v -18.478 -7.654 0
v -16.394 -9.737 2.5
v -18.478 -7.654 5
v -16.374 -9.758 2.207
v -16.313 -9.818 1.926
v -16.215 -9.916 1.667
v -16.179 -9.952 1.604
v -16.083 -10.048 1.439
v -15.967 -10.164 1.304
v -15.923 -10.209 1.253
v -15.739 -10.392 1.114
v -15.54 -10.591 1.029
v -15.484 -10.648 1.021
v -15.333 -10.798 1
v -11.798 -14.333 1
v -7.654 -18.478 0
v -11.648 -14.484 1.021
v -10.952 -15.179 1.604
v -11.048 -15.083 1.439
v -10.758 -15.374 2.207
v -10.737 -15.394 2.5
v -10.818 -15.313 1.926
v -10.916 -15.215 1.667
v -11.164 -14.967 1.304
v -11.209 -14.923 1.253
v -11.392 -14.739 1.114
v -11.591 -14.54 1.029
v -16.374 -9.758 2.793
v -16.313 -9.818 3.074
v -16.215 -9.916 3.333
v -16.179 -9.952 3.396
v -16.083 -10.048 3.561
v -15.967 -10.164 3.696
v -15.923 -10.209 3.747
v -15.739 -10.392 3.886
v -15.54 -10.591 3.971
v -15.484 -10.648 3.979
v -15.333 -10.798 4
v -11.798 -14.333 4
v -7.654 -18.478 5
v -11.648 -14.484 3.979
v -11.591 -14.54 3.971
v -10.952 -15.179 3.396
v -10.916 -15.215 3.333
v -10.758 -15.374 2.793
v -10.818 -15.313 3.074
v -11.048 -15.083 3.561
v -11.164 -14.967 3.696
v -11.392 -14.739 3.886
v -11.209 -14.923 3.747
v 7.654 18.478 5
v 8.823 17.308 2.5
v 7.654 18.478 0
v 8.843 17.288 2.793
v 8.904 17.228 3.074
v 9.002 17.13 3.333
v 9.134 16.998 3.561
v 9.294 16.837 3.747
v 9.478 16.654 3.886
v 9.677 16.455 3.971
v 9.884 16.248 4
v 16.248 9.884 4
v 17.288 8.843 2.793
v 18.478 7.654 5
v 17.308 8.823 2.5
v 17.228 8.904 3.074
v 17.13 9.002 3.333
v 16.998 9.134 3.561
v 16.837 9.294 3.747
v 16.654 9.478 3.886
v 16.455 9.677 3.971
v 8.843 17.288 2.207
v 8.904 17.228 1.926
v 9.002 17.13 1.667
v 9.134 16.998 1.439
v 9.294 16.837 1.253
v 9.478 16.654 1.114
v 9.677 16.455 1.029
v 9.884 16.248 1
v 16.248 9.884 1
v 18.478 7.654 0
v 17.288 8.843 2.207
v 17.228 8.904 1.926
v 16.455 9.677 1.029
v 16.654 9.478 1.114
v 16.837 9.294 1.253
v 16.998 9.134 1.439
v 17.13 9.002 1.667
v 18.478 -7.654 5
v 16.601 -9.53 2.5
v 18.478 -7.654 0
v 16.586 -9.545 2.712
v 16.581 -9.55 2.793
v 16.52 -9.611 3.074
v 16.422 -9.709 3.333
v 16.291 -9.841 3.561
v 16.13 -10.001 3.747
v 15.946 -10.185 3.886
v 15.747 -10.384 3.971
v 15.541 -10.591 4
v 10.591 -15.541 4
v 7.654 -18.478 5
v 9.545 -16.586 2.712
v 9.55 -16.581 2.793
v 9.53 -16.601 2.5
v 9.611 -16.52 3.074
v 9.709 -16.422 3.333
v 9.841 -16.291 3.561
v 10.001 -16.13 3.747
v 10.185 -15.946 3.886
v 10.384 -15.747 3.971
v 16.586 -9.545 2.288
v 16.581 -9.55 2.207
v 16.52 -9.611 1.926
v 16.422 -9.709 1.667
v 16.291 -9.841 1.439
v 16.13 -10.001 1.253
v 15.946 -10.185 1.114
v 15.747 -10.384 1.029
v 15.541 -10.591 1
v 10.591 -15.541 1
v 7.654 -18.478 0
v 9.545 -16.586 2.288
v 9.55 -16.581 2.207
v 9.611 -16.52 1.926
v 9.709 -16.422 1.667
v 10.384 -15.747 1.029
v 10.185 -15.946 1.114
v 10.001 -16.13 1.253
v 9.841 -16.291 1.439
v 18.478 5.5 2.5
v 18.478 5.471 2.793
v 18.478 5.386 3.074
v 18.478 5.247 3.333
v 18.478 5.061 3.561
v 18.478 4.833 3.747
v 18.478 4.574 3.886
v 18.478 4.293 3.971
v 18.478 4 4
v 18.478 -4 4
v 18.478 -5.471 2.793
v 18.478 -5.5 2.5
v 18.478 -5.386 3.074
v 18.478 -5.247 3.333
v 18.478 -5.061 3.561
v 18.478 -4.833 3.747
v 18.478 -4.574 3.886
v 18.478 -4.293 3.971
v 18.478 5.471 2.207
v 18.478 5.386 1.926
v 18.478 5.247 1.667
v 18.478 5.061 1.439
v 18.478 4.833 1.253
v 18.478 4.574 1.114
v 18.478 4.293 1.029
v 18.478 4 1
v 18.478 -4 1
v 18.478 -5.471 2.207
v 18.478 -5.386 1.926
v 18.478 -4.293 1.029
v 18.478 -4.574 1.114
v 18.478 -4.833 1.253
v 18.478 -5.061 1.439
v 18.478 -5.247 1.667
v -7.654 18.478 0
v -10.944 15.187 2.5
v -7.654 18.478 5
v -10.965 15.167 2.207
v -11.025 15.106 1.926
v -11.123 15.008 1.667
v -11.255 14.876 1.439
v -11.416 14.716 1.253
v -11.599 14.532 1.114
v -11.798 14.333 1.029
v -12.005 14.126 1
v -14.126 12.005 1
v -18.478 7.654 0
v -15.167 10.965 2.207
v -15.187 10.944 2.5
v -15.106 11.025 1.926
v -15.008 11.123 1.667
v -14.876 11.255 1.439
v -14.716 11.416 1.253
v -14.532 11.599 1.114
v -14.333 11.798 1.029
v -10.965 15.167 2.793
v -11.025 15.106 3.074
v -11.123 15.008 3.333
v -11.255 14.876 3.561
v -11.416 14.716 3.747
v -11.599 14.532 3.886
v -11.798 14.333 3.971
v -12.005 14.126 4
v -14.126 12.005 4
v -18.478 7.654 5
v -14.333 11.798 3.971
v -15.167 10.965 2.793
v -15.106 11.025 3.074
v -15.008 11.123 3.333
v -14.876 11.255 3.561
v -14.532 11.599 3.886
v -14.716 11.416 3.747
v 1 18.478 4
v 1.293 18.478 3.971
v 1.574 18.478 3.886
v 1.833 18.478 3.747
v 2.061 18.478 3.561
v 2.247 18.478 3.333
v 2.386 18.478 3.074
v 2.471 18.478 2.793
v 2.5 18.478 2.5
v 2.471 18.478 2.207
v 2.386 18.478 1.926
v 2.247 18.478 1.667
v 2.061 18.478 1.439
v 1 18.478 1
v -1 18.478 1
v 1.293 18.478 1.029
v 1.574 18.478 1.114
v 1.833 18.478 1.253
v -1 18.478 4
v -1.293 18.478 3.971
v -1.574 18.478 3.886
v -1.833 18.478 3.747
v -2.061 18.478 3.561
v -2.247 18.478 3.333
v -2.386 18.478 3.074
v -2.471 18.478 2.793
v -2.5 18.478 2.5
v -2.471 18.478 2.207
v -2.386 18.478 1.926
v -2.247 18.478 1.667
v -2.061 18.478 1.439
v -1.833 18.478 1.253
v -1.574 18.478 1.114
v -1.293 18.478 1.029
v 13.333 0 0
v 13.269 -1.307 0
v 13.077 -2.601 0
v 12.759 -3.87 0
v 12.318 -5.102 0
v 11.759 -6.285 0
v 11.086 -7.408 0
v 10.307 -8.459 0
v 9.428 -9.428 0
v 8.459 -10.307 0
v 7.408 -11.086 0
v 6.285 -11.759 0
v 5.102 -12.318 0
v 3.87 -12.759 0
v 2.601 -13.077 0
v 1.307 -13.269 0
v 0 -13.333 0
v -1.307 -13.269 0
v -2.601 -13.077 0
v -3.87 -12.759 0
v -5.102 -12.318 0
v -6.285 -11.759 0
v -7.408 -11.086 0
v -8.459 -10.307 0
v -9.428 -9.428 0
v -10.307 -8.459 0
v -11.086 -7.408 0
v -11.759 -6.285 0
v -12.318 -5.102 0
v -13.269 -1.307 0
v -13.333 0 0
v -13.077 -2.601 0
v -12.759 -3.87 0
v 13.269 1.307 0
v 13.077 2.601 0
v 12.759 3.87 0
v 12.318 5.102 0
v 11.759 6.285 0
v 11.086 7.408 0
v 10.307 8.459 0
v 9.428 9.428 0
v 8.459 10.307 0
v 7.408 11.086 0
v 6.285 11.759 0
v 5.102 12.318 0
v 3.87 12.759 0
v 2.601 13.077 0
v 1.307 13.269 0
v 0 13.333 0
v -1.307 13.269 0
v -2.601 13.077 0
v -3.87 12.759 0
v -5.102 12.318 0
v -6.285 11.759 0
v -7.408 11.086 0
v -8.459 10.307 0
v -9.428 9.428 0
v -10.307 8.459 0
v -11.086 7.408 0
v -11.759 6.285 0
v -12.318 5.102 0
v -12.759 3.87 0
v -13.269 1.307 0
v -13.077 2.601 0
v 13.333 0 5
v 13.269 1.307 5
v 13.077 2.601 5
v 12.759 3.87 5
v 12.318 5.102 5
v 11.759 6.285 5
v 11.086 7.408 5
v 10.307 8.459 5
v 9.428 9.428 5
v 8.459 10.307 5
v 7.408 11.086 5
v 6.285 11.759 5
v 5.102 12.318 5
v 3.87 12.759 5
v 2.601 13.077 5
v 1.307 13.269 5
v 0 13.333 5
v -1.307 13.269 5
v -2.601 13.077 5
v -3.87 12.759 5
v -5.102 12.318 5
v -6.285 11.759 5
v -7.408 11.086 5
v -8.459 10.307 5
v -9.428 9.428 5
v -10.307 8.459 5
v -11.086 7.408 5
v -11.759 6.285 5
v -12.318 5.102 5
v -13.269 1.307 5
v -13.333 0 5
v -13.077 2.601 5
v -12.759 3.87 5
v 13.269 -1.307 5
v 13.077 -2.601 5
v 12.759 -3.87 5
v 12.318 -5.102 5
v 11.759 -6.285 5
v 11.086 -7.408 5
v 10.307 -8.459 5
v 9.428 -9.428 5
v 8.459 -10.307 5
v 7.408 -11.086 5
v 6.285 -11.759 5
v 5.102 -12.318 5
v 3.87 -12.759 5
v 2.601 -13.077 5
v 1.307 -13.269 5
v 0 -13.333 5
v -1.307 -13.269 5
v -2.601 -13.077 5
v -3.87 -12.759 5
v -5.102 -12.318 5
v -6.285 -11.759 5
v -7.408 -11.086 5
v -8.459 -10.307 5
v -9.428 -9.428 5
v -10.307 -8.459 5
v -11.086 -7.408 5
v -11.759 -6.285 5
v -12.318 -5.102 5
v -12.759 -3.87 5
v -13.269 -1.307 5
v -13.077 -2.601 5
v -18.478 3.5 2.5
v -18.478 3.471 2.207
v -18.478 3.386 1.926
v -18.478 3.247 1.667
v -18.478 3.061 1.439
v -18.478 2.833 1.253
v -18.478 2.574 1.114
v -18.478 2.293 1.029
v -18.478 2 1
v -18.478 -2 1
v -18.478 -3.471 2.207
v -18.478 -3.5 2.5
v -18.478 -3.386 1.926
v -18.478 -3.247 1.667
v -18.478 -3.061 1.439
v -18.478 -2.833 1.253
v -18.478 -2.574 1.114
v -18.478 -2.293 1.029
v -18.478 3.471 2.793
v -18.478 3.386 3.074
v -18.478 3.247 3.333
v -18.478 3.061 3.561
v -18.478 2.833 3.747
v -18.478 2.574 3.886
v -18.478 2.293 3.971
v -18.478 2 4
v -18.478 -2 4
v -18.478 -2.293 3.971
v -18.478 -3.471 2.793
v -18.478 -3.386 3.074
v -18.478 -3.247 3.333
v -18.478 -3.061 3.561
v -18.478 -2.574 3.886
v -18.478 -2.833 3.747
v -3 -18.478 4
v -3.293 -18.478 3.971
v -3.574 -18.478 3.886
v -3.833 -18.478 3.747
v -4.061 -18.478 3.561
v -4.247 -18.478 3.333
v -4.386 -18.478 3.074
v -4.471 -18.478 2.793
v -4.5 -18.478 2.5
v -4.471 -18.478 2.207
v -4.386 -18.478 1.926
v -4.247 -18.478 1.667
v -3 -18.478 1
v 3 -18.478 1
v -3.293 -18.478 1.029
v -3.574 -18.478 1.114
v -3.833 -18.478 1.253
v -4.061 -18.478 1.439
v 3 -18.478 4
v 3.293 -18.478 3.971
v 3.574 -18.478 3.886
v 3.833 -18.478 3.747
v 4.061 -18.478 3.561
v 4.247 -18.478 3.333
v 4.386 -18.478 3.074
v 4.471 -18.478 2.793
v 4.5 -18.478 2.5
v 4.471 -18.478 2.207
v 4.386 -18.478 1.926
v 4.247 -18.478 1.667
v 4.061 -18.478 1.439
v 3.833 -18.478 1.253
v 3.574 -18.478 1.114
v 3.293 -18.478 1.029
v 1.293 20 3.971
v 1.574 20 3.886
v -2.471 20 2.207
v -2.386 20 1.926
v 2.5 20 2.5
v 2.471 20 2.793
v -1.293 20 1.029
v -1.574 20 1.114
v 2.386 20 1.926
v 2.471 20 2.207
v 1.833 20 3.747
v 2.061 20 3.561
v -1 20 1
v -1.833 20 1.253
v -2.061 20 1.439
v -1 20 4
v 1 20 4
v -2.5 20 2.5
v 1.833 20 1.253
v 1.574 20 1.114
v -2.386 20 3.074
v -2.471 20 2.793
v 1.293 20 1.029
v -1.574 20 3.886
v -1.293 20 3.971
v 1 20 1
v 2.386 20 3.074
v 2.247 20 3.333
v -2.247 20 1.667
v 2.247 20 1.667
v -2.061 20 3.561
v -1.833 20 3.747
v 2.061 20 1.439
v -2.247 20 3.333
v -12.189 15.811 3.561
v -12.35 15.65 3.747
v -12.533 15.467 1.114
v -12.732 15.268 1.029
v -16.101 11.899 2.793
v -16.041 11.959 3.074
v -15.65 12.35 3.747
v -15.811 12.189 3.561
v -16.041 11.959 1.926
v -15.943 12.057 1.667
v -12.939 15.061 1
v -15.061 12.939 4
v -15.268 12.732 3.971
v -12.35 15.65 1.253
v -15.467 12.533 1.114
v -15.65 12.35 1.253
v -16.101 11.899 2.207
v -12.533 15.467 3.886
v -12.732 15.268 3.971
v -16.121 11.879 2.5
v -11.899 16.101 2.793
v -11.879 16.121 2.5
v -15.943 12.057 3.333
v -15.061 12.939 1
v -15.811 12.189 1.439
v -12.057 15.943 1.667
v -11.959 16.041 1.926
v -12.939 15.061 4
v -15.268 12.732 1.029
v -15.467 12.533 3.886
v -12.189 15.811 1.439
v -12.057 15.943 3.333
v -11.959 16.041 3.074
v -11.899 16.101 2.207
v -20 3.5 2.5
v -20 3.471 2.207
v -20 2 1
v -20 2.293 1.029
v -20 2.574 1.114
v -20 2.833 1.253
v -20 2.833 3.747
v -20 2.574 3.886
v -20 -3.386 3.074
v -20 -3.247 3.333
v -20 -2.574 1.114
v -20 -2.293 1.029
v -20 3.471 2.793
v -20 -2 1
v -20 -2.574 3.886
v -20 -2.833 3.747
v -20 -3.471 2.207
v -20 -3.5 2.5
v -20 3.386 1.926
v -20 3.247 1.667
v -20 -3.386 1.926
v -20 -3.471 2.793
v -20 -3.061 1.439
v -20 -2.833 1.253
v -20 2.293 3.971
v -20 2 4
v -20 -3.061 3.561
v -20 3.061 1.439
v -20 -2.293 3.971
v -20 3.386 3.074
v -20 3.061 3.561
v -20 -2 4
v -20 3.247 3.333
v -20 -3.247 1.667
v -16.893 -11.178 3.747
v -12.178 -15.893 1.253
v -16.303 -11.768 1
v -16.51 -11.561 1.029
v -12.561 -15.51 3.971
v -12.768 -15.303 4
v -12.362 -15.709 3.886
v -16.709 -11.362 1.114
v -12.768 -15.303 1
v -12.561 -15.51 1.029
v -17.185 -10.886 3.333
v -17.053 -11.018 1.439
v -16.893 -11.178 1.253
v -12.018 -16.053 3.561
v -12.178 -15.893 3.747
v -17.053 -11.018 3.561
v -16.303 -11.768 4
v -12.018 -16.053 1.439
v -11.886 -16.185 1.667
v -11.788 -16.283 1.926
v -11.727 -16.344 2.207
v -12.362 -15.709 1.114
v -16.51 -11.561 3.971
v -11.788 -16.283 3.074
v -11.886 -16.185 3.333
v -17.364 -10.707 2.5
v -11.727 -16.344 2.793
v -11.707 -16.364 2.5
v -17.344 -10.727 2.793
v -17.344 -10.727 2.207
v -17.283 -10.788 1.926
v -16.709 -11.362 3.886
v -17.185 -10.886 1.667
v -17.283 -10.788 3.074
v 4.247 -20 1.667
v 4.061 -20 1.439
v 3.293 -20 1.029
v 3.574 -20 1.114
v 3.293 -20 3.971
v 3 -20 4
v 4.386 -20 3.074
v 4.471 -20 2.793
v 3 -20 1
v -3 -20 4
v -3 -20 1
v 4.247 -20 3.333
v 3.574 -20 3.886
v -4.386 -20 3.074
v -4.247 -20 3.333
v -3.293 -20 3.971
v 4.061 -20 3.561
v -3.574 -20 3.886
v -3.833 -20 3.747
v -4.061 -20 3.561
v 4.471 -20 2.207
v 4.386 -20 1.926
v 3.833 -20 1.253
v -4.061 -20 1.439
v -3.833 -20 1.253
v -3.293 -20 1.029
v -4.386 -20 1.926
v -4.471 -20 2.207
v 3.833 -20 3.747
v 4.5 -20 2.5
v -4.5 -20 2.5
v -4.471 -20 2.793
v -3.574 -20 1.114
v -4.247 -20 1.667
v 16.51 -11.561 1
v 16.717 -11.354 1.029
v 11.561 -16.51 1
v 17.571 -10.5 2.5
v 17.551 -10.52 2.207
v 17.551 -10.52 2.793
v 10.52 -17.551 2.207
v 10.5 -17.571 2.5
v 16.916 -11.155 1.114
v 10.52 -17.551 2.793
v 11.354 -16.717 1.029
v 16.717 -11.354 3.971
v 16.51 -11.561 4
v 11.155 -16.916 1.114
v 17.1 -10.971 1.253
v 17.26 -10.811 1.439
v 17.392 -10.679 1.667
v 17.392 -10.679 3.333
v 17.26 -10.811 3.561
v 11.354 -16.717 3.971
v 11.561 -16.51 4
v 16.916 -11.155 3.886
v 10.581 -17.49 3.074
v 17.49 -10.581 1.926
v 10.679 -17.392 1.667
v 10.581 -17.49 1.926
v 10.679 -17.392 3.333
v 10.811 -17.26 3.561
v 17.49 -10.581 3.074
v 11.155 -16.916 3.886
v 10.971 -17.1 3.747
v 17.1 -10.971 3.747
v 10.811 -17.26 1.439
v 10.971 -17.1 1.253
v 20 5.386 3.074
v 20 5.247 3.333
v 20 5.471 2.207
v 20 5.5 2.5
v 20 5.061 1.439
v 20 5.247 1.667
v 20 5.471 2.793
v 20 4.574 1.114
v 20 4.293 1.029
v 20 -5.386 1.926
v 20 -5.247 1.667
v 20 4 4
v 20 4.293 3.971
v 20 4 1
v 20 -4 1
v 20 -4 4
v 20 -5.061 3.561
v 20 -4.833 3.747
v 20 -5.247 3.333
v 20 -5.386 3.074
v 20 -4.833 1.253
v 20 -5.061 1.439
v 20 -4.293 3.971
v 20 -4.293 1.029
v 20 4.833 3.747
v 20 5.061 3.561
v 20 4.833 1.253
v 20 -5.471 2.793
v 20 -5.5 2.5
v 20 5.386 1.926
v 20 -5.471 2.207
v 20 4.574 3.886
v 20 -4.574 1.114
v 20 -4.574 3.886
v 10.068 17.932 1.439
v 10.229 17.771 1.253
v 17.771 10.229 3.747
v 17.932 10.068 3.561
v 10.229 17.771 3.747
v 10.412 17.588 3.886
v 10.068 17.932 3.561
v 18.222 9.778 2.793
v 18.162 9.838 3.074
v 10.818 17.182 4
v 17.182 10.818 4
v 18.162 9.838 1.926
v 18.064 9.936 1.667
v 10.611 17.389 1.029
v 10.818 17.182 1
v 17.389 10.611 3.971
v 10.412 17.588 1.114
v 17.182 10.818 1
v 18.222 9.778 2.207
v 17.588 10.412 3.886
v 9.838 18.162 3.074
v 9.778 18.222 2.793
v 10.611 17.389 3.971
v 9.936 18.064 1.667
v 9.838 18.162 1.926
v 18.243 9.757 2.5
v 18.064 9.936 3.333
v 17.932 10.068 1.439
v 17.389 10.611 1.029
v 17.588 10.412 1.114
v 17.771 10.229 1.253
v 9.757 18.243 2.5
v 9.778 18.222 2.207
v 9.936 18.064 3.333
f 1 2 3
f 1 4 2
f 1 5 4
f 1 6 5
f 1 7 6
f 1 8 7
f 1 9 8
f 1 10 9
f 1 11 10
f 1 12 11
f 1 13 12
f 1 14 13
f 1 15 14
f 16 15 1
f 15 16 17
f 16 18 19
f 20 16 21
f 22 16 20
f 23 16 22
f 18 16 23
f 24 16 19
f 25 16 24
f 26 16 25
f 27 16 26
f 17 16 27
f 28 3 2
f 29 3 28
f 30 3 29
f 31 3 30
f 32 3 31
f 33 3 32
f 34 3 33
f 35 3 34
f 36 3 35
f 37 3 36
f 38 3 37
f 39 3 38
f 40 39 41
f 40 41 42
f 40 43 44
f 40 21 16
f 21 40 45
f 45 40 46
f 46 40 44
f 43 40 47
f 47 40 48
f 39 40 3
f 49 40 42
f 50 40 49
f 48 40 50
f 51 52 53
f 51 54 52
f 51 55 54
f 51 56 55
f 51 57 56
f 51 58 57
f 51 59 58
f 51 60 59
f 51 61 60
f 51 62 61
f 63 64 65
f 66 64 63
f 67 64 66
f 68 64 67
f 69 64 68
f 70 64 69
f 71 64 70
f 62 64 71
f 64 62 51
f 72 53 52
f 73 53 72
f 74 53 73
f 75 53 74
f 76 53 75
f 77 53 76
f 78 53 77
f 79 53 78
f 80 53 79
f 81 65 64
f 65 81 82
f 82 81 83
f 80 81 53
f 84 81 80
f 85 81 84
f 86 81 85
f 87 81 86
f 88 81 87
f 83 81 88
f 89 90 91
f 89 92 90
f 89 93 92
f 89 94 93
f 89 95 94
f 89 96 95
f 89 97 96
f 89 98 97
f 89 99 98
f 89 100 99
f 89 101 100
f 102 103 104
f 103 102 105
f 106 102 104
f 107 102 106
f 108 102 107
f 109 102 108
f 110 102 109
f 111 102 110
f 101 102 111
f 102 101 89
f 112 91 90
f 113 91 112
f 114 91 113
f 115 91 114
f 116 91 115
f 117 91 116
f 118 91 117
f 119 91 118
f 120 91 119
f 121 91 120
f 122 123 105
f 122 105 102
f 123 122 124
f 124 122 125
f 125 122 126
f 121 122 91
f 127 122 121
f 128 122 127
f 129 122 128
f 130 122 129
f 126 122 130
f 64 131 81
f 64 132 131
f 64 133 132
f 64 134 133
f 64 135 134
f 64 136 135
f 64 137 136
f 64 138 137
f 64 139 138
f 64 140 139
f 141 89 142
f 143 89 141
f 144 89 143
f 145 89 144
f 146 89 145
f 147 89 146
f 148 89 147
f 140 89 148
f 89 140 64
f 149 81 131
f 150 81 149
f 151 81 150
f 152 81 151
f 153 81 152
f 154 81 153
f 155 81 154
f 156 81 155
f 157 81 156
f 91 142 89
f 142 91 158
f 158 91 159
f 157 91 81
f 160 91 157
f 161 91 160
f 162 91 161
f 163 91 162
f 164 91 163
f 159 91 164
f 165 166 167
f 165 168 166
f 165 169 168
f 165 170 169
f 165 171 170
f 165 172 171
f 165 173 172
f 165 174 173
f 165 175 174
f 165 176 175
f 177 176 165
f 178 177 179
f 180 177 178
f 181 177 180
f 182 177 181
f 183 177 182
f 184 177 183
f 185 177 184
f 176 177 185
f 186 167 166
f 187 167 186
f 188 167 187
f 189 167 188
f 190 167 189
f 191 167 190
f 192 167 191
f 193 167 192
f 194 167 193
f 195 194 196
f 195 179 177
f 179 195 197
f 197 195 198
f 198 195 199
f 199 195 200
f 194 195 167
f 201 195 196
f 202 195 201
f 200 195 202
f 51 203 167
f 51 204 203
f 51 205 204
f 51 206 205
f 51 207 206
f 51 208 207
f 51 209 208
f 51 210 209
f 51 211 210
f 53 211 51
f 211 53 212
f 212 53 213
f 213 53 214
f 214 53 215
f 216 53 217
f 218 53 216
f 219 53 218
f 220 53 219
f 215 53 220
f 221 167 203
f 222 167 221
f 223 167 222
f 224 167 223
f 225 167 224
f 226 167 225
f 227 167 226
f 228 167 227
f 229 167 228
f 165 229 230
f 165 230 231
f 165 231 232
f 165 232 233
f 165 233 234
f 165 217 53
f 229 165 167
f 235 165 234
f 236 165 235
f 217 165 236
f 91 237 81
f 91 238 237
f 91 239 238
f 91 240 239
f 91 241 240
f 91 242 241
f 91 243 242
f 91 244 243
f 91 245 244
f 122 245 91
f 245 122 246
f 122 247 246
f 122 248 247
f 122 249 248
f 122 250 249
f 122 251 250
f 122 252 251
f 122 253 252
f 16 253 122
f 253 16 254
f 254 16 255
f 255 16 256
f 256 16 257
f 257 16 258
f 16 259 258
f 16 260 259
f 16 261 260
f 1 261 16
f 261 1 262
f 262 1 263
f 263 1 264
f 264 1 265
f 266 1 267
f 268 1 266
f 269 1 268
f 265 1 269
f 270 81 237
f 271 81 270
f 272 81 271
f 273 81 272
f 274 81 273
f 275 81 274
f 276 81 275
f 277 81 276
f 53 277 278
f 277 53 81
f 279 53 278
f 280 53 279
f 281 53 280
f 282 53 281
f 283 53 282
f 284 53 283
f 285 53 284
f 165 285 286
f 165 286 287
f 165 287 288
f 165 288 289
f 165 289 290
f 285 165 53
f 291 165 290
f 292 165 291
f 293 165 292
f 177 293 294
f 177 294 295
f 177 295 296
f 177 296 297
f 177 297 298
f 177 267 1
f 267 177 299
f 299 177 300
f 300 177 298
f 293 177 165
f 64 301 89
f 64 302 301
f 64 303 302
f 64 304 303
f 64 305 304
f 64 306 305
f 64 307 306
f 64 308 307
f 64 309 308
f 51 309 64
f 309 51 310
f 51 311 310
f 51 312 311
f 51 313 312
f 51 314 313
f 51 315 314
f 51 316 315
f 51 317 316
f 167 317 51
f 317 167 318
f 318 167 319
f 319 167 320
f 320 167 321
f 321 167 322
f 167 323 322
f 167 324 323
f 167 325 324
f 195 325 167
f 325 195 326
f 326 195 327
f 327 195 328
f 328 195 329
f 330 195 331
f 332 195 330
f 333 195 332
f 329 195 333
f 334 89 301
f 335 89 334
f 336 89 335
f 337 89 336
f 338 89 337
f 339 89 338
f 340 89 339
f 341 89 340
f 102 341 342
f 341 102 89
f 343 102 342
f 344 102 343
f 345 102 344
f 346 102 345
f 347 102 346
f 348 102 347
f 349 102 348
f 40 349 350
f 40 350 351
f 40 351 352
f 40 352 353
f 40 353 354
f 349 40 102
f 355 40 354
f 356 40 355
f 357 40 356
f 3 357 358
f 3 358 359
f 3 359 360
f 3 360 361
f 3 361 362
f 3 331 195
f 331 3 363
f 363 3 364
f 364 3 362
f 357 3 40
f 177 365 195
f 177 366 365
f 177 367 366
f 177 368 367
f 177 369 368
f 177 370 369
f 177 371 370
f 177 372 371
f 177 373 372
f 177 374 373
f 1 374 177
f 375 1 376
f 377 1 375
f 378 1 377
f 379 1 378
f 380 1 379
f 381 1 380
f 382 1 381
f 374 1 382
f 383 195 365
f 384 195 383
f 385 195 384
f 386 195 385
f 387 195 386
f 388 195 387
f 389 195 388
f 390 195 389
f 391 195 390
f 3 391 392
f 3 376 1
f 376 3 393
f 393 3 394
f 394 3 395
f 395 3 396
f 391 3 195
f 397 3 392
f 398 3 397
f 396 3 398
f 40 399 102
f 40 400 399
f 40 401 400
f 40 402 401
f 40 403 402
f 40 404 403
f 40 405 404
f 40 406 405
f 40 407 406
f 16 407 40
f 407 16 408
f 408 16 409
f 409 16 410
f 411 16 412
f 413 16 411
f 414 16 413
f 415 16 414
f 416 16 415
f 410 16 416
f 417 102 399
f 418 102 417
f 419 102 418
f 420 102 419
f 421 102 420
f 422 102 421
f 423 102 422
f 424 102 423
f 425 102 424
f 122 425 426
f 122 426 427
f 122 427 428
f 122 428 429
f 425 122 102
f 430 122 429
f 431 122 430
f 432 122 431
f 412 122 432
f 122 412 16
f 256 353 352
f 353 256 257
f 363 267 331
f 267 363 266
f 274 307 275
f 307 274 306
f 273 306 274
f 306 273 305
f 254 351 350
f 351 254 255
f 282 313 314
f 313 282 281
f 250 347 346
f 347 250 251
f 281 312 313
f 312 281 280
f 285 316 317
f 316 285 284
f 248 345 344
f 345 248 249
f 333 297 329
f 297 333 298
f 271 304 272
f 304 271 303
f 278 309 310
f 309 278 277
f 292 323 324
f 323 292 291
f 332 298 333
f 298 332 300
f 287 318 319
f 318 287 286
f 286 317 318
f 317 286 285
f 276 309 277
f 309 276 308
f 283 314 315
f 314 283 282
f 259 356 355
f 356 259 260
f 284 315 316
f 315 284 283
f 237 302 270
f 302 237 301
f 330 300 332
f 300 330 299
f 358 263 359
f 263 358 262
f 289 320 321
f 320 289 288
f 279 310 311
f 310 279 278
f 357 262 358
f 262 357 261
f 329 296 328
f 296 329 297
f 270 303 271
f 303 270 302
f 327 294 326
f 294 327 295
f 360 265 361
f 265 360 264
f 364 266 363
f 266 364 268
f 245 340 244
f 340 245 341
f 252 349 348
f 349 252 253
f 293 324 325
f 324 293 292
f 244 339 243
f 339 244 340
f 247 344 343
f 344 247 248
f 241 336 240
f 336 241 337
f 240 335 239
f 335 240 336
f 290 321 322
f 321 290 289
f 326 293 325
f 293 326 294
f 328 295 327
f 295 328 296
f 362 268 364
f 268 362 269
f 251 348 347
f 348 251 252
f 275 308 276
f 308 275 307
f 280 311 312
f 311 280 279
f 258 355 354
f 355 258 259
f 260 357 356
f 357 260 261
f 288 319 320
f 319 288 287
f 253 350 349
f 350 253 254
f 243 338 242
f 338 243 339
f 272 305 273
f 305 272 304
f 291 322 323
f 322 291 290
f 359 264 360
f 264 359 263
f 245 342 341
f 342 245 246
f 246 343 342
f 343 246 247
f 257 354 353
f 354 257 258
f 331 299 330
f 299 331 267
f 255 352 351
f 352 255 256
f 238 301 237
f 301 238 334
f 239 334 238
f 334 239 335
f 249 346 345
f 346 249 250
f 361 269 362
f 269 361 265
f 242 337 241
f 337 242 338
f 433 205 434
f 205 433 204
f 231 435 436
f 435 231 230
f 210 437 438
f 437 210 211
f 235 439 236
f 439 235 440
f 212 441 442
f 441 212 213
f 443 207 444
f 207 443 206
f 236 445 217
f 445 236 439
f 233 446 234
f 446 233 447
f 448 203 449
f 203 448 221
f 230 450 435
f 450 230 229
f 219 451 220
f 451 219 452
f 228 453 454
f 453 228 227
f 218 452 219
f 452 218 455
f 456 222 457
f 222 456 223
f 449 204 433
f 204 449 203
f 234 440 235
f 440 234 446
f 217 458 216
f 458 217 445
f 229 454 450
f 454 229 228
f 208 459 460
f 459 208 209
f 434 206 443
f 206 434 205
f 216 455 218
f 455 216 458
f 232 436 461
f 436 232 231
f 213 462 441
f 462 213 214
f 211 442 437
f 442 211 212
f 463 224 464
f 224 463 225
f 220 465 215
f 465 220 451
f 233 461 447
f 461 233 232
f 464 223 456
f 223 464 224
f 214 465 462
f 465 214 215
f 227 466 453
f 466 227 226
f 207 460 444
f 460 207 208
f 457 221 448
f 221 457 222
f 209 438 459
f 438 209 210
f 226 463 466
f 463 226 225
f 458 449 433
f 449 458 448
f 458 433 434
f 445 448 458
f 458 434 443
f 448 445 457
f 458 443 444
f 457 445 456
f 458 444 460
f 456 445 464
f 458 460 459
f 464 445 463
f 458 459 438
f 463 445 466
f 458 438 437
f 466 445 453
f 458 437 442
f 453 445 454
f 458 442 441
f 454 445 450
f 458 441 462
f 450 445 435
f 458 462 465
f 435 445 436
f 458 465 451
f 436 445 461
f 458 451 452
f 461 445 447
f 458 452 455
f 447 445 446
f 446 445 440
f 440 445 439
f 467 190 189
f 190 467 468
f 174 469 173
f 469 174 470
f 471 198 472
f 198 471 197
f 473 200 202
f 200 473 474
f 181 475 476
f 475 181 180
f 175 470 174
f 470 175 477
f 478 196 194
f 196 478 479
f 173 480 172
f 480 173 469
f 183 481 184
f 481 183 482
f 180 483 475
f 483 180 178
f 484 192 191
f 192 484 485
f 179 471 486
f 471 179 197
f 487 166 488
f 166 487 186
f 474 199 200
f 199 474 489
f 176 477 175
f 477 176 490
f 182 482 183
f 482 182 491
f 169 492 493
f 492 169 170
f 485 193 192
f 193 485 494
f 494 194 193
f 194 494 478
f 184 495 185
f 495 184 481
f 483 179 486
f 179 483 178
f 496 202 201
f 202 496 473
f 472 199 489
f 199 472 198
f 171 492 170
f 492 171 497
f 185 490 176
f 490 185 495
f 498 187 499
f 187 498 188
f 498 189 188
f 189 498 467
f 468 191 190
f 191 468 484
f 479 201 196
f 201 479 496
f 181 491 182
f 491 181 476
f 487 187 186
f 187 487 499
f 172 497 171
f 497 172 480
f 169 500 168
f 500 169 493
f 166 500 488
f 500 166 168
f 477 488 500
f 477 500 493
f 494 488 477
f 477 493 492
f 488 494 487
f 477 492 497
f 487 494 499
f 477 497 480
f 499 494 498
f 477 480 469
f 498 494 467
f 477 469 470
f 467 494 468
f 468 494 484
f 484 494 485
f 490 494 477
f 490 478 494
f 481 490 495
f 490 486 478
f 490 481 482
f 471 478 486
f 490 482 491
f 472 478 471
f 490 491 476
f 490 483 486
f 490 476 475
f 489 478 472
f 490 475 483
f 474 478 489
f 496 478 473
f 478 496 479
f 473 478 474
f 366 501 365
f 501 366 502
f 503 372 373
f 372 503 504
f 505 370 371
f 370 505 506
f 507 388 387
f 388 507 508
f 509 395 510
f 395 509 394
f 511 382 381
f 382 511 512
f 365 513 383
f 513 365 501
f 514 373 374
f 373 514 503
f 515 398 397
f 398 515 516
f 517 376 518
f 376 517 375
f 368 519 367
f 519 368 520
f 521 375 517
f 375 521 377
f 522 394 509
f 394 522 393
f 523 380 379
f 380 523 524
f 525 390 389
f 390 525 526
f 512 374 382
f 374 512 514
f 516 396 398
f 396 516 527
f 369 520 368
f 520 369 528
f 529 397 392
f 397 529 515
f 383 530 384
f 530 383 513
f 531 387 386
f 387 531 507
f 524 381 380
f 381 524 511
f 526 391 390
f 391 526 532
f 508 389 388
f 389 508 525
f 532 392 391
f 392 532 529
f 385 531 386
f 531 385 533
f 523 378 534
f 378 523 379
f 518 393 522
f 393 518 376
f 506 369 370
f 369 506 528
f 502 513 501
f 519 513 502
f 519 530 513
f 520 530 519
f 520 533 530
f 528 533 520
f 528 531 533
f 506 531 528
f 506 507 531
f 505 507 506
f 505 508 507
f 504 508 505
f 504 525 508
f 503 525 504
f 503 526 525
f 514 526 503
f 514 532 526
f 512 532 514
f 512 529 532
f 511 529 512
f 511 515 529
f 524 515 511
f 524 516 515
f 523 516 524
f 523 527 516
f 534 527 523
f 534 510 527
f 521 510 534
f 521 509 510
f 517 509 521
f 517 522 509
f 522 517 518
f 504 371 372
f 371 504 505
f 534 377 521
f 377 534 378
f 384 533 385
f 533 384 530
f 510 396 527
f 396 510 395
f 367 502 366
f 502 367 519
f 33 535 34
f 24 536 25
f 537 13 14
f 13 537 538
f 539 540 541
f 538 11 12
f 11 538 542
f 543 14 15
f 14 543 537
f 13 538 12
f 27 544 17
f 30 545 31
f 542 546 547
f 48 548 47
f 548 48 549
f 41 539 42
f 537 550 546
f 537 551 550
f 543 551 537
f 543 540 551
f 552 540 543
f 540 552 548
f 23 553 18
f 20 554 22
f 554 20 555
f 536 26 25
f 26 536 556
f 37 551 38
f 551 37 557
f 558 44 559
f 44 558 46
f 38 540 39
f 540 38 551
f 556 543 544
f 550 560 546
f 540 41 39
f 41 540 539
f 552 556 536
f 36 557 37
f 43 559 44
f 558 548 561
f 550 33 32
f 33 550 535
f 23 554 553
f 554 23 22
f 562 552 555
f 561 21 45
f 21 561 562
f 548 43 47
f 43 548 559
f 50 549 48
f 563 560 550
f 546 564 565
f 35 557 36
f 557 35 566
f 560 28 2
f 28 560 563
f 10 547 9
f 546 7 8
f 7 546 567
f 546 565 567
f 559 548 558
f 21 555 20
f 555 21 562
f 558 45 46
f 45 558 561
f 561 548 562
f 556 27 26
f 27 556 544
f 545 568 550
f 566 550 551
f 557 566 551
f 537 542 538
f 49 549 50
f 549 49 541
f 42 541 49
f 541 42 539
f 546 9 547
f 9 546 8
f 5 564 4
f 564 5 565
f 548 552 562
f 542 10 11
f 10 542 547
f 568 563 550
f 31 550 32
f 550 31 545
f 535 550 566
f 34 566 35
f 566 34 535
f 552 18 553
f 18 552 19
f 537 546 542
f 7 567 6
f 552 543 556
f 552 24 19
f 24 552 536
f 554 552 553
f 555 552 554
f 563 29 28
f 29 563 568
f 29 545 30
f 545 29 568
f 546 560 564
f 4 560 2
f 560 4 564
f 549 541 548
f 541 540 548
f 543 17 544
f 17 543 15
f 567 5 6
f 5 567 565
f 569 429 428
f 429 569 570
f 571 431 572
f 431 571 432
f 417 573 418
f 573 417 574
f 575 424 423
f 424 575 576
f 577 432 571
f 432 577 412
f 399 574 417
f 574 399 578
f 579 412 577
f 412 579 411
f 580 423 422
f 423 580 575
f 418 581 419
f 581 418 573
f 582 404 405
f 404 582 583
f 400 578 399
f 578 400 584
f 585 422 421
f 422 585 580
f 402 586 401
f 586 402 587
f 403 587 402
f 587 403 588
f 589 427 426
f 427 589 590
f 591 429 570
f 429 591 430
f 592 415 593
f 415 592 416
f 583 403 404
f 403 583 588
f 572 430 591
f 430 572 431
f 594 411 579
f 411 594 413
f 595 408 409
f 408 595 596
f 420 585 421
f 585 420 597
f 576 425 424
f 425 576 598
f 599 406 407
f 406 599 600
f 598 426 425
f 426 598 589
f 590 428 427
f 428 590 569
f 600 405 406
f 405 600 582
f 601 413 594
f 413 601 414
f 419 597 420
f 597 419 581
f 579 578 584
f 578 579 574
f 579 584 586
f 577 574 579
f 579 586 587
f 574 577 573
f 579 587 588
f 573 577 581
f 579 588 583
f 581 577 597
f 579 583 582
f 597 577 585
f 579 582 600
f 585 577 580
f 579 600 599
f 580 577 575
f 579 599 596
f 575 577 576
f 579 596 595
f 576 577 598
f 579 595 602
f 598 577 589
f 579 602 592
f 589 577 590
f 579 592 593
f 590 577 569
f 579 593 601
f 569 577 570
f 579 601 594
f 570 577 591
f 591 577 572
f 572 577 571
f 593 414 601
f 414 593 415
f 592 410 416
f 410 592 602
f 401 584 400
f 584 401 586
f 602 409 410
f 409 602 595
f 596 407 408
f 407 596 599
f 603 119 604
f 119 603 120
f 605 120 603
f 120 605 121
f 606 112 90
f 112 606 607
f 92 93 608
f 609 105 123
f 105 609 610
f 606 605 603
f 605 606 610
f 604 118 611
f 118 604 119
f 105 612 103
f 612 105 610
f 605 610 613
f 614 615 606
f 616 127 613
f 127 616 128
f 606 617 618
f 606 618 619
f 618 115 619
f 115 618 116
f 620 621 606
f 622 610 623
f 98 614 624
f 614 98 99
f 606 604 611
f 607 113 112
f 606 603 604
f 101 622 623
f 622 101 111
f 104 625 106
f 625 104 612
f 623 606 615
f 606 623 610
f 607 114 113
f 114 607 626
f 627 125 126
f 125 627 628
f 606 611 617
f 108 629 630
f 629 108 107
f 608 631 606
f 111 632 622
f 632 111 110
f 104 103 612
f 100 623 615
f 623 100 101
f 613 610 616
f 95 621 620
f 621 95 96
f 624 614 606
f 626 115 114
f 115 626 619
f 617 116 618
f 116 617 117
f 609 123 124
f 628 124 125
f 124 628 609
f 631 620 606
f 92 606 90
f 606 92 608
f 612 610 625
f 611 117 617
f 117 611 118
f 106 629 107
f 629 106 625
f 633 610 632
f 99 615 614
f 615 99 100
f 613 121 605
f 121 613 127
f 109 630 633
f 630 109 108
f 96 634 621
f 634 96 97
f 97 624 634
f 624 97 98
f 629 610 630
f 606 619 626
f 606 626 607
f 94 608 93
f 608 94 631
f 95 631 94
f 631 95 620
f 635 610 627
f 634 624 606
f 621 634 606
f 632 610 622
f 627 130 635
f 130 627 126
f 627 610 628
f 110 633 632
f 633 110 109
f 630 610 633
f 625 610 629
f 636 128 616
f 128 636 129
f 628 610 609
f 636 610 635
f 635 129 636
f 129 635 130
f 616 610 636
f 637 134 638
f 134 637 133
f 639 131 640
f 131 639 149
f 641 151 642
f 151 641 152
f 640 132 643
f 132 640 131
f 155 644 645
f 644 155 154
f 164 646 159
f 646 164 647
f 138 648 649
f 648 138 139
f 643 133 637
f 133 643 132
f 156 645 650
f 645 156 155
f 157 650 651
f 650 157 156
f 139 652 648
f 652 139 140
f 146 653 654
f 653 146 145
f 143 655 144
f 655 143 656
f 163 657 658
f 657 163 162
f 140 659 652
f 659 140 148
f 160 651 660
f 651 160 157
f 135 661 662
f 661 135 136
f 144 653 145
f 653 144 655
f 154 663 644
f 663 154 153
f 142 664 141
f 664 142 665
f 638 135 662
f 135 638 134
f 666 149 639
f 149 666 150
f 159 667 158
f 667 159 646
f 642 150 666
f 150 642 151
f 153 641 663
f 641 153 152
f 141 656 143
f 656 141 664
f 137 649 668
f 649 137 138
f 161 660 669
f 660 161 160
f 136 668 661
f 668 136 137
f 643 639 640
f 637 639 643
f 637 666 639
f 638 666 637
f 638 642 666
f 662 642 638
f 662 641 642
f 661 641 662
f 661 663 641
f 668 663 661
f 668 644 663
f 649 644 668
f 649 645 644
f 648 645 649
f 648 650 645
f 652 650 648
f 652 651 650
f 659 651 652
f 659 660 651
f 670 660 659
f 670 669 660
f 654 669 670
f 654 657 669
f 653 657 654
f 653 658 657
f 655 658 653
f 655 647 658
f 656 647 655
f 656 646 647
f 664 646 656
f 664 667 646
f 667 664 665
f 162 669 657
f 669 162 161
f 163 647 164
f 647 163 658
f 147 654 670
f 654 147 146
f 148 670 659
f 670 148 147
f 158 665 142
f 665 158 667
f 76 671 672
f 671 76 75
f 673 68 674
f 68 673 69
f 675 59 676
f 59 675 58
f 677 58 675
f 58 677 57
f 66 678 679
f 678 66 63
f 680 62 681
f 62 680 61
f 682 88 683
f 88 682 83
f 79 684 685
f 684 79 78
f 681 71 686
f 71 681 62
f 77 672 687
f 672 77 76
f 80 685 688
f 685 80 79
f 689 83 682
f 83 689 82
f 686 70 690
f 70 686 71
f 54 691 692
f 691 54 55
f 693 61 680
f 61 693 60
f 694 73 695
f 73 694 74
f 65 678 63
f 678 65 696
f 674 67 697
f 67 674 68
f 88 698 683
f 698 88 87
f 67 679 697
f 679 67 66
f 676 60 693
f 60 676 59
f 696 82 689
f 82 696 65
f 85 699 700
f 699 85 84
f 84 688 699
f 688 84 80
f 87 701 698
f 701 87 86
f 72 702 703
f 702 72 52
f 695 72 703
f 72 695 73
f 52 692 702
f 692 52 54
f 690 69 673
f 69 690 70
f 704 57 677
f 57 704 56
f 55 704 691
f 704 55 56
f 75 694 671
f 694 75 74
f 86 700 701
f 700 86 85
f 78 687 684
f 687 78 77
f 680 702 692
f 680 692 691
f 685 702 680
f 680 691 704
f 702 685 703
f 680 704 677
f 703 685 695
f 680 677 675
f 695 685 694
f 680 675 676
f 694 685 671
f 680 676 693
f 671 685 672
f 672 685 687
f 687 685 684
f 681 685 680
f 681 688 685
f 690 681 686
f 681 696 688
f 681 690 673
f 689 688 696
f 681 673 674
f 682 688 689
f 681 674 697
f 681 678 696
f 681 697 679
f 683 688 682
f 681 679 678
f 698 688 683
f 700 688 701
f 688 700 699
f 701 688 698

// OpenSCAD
// Hull shape module
module hullz(length = 1, w = 3, h = 1) {
    radius = w / 2;

    rotate([90, 90, 0]) {
        hull() {
            translate([-length / 2, 0, 0])
                cylinder(h = h, r = radius, $fn = 32);
            translate([length / 2, 0, 0])
                cylinder(h = h, r = radius, $fn = 32);
        }
    }
}

// Octagon with center hole
module octagonz(size = 20, height = 5) {
    a = size / 1.5;
    
    echo("A: ", a);
    points = [
        for (i = [0 : 7])
            [ size * cos(360 * i / 8), size * sin(360 * i / 8) ]
    ];

    rotate([0, 0, 22.5])  // align flat side
        difference() {
            linear_extrude(height)
                polygon(points);

            translate([0, 0, -1])  // penatrate
                cylinder(h = height + 2, r = a, $fn = 64);
        }
}
module mk_ring(){
// Show octagon
octagon_height = 5;
octagon_size = 20;
octagonz(octagon_size, octagon_height);

// hullz 1
translate([0, octagon_size, octagon_height / 2])
    rotate([0, 90, 0])
        hullz(length = 2, w = 3, h = octagon_height);


// hullz 2
translate([-14, 14, octagon_height / 2])
    rotate([0, 90, 45]) // hull rotation
        hullz(length = 3, w = 3, h = octagon_height);

// hullz 3
translate([-20, 0, octagon_height / 2])
    rotate([0, 90, 90]) // hull rotation
        hullz(length = 4, w = 3, h = octagon_height);
        
// hullz 4
translate([-11, -10, octagon_height / 2])
    rotate([0, 90, -45]) // hull rotation
        hullz(length = 5, w = 3, h = octagon_height);        
        
// hullz 5
translate([0, -15, octagon_height / 2])
    rotate([0, 90, 0]) // hull rotation
        hullz(length = 6, w = 3, h = octagon_height);           
    
// hullz 6
translate([10.5, -10.5, octagon_height / 2])
    rotate([0, 90, 45]) // hull rotation
        hullz(length = 7, w = 3, h = octagon_height); 
        
// hullz 7
translate([15, 0, octagon_height / 2])
    rotate([0, 90, 90]) // hull rotation
        hullz(length = 8, w = 3, h = octagon_height);

// hullz 8
translate([14, 14, octagon_height / 2])
    rotate([0, 90, -45]) // hull rotation
        hullz(length = 9, w = 3, h = octagon_height);  
 
 }
 
 mk_ring();
